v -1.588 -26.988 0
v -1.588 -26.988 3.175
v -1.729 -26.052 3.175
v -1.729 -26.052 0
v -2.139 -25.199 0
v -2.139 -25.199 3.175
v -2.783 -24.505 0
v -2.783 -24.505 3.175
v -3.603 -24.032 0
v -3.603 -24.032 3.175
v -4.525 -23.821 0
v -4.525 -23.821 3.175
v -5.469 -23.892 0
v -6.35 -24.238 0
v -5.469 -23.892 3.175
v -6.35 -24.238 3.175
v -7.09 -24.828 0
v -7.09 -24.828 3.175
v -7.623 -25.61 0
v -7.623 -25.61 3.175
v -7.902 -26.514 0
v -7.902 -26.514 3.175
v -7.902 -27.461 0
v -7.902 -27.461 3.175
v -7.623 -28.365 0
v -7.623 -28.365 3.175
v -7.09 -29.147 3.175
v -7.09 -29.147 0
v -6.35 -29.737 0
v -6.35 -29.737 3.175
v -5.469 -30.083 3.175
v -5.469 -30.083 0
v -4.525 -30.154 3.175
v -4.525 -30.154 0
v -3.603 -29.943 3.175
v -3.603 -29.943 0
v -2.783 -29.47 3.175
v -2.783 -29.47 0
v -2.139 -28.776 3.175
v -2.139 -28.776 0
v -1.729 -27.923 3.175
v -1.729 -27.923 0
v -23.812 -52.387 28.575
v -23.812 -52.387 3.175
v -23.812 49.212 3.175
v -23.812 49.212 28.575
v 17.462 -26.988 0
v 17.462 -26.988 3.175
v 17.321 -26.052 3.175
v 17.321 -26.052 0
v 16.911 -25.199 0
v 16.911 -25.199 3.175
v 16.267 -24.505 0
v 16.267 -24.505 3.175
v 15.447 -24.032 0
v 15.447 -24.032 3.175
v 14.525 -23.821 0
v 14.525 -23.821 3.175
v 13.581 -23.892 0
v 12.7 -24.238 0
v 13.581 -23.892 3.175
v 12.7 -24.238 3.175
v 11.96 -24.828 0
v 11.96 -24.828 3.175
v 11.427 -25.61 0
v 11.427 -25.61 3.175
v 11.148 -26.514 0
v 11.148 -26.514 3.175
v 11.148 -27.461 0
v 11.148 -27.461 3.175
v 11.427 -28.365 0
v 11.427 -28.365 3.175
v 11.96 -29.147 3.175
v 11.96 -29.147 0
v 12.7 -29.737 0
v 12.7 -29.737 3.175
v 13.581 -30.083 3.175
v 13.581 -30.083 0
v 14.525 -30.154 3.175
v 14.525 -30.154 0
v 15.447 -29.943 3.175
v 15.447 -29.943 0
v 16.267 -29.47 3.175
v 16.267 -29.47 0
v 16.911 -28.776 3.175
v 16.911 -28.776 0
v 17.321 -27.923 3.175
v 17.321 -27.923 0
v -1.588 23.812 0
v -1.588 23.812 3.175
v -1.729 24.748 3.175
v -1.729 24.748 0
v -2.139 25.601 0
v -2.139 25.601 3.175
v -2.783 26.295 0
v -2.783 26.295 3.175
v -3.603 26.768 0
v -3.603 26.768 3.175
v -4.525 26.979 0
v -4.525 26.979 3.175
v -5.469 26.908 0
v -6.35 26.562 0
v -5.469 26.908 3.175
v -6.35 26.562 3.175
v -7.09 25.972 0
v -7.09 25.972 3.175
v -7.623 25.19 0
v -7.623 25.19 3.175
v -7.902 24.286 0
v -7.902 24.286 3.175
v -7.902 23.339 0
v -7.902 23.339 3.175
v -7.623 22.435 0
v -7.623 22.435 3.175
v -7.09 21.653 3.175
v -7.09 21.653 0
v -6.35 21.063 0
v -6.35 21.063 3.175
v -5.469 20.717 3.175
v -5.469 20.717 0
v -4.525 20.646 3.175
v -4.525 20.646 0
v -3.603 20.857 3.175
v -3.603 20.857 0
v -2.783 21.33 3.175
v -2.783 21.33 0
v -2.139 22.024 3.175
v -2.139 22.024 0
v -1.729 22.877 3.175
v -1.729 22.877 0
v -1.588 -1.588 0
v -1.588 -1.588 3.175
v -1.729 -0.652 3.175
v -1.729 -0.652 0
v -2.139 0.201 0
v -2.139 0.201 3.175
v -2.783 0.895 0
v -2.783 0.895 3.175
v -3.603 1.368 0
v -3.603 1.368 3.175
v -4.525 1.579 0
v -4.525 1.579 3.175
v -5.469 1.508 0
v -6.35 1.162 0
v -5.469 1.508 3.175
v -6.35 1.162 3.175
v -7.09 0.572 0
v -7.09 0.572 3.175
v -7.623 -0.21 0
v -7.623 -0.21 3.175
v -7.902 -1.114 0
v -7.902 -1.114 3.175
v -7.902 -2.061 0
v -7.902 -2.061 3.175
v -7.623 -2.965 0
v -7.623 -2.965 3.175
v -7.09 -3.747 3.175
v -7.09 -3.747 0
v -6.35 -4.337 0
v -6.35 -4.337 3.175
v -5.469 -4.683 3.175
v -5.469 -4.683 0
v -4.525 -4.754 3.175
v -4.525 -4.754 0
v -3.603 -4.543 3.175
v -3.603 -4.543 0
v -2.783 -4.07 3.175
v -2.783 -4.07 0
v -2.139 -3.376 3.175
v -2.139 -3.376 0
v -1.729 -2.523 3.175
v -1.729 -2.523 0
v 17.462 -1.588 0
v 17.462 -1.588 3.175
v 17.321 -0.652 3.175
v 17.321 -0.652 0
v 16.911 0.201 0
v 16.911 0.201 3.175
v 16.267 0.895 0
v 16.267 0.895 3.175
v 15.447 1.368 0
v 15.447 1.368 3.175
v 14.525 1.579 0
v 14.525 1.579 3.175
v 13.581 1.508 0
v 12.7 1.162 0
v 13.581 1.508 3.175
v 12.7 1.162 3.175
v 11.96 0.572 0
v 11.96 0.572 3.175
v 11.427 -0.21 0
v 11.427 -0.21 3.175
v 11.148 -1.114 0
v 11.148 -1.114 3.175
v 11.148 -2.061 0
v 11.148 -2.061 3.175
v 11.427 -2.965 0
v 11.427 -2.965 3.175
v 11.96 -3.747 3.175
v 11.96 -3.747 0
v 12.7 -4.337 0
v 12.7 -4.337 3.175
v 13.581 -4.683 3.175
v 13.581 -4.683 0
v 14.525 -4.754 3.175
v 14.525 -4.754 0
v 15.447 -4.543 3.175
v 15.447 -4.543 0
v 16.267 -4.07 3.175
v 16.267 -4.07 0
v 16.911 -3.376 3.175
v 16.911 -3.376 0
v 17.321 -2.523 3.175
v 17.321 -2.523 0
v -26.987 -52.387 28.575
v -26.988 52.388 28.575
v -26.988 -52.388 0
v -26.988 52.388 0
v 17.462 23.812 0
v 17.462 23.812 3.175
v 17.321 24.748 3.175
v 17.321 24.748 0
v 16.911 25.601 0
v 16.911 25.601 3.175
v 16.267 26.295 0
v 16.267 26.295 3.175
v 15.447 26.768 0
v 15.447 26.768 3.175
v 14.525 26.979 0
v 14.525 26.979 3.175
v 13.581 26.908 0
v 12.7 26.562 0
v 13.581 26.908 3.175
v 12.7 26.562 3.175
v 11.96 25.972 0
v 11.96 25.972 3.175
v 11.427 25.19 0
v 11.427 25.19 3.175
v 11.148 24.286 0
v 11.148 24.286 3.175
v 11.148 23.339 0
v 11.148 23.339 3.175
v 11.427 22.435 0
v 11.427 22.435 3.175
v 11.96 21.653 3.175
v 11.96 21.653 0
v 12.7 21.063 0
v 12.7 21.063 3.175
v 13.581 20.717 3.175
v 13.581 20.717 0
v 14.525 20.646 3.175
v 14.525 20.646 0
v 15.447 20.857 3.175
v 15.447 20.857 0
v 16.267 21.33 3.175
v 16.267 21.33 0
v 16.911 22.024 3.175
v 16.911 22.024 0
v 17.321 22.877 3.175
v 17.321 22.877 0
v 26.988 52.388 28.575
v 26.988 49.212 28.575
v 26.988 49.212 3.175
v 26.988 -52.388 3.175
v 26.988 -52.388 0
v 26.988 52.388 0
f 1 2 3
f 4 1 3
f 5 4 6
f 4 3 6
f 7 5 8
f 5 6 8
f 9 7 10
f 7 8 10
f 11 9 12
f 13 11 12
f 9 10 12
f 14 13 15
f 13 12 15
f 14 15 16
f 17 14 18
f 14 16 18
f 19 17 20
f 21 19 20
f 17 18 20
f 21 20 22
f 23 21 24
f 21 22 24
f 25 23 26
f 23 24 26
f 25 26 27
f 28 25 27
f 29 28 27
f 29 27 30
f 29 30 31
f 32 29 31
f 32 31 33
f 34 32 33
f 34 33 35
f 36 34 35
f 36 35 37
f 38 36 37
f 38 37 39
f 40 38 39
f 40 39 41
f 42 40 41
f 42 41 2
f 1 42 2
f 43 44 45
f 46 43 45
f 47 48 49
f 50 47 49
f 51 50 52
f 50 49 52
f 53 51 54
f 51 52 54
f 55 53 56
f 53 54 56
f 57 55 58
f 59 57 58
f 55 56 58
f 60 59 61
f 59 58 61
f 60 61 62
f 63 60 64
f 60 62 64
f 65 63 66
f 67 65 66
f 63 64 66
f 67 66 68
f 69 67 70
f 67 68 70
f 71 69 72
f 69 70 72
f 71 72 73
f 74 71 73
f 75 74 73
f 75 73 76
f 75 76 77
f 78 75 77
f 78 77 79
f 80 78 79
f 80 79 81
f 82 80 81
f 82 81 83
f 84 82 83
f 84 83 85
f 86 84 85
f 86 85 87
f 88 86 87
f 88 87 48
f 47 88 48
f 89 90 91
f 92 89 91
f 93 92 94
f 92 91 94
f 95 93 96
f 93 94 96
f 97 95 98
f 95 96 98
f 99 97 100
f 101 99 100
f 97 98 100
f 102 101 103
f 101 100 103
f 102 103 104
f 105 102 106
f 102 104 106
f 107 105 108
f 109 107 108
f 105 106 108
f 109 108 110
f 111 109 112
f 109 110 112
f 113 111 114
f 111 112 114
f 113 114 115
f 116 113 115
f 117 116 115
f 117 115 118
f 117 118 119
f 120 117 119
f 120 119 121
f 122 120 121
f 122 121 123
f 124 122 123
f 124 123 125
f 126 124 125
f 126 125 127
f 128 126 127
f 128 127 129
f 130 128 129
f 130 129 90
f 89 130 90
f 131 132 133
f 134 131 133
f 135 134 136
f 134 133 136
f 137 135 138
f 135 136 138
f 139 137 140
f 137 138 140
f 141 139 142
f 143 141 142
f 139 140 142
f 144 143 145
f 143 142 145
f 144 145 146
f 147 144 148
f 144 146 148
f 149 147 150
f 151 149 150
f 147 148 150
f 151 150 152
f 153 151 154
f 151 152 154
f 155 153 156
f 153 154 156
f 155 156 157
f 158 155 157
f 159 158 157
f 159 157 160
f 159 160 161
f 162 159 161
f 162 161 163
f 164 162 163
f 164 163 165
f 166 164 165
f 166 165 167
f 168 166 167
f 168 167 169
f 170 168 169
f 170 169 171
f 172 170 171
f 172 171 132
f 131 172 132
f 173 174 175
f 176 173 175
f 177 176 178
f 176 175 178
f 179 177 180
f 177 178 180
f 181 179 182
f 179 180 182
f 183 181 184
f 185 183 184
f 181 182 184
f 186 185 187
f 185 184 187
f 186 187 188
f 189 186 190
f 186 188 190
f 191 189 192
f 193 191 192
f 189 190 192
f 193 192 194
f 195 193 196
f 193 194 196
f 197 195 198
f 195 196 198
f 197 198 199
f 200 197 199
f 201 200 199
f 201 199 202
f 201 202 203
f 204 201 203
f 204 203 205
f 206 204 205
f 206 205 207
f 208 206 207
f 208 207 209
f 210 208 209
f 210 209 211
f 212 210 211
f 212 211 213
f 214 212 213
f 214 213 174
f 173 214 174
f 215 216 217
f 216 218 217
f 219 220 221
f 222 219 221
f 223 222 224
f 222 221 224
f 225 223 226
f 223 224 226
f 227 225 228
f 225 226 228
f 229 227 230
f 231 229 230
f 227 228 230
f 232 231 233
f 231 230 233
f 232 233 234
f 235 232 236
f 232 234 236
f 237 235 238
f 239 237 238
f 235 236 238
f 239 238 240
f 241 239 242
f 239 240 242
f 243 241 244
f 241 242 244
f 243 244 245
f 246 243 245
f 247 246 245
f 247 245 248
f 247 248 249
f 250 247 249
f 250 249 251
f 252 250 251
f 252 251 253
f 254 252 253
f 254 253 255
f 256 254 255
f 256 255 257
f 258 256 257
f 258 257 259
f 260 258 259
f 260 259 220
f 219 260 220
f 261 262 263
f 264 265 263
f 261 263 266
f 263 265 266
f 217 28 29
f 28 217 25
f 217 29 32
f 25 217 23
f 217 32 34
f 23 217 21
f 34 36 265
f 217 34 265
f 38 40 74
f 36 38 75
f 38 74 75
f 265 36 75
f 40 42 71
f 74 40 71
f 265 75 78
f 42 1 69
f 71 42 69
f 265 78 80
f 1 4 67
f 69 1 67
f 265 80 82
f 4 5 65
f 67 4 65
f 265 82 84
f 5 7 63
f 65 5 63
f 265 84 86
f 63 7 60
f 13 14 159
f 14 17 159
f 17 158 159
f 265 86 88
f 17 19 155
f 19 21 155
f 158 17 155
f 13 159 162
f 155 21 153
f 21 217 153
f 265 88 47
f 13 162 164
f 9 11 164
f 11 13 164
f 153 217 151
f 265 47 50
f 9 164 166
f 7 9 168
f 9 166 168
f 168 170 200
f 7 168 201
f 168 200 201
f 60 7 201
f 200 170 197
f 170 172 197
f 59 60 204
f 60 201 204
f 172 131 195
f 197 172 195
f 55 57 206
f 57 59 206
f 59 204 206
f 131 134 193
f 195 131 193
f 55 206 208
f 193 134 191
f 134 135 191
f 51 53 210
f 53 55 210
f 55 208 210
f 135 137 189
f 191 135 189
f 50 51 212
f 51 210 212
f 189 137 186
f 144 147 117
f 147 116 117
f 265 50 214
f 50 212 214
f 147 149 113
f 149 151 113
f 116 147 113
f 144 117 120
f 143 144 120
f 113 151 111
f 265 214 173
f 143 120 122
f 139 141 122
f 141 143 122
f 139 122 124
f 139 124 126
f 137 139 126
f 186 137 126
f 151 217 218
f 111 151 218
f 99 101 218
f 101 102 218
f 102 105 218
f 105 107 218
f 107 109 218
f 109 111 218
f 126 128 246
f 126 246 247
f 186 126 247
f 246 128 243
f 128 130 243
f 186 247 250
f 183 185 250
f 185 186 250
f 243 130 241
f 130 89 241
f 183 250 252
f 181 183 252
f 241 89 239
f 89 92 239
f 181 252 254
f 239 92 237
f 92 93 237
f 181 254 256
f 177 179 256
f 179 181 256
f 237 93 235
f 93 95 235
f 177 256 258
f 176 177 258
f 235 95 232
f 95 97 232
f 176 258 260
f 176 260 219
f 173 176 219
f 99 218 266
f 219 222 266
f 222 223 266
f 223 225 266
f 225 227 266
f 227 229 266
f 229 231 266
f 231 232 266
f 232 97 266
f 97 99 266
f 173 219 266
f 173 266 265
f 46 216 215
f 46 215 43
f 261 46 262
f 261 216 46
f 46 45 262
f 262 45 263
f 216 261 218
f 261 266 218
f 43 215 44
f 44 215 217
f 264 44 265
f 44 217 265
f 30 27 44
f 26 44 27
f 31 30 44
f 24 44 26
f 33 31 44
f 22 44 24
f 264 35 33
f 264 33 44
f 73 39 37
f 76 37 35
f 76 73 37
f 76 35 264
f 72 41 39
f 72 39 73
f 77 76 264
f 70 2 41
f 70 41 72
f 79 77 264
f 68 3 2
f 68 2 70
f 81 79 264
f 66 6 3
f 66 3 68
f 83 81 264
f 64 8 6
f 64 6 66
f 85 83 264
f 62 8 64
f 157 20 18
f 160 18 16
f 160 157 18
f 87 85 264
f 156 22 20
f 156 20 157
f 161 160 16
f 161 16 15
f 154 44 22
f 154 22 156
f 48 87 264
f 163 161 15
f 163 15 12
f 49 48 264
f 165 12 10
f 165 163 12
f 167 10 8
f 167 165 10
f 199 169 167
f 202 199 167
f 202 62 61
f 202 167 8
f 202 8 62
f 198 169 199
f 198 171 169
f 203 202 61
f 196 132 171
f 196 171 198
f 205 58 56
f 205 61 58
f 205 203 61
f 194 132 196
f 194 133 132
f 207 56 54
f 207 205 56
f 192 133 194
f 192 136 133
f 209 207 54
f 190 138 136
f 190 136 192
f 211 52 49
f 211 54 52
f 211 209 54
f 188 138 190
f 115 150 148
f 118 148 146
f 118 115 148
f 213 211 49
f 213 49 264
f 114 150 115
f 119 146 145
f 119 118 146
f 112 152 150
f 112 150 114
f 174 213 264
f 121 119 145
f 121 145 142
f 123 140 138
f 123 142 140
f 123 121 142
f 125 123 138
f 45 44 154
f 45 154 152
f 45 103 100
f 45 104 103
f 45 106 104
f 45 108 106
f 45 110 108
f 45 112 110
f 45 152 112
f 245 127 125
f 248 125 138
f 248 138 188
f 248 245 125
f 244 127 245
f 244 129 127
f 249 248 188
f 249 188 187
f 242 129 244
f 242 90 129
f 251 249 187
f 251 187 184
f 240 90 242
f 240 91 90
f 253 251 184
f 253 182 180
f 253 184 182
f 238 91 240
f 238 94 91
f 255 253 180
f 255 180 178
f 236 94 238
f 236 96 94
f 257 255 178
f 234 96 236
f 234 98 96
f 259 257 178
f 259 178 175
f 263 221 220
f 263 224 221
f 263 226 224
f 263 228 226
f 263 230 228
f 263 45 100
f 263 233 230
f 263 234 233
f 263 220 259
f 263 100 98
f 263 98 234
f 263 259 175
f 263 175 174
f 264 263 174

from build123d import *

# Parameters (mm, degrees)
F0_W     = 53.975
F0_H     = 104.775
F1_DEPTH = 3.175
F3_W     = 3.175
F3_H     = 101.6
F4_DEPTH = 25.4
F2_R     = 3.175
F5_DEPTH = 25.4


with BuildPart() as f1:
    # F0 (on Top) → F1 (new body)
    with BuildSketch(Plane.XY):
        Rectangle(F0_W, F0_H)
    extrude(amount=F1_DEPTH)

    # F3 (on face) → F4 (join)
    with BuildSketch(Plane.XY.offset(3.175)):
        Polygon((-23.8125, 49.2125), (26.9875, 49.2125), (26.9875, 52.3875), (-26.9875, 52.3875), (-26.9875, 49.2125), align=None)
        with Locations((-25.4, -1.5875)):
            Rectangle(F3_W, F3_H)
    extrude(amount=F4_DEPTH)

    # F2 (on face) → F5 (cut)
    with BuildSketch(Plane.XY.offset(3.175)):
        with Locations((-4.7625, 23.8125)):
            Circle(F2_R)
        with Locations((14.2875, 23.8125)):
            Circle(F2_R)
        with Locations((-4.7625, -1.5875)):
            Circle(F2_R)
        with Locations((14.2875, -1.5875)):
            Circle(F2_R)
        with Locations((-4.7625, -26.9875)):
            Circle(F2_R)
        with Locations((14.2875, -26.9875)):
            Circle(F2_R)
    extrude(amount=-F5_DEPTH, mode=Mode.SUBTRACT)


solid = f1.part
